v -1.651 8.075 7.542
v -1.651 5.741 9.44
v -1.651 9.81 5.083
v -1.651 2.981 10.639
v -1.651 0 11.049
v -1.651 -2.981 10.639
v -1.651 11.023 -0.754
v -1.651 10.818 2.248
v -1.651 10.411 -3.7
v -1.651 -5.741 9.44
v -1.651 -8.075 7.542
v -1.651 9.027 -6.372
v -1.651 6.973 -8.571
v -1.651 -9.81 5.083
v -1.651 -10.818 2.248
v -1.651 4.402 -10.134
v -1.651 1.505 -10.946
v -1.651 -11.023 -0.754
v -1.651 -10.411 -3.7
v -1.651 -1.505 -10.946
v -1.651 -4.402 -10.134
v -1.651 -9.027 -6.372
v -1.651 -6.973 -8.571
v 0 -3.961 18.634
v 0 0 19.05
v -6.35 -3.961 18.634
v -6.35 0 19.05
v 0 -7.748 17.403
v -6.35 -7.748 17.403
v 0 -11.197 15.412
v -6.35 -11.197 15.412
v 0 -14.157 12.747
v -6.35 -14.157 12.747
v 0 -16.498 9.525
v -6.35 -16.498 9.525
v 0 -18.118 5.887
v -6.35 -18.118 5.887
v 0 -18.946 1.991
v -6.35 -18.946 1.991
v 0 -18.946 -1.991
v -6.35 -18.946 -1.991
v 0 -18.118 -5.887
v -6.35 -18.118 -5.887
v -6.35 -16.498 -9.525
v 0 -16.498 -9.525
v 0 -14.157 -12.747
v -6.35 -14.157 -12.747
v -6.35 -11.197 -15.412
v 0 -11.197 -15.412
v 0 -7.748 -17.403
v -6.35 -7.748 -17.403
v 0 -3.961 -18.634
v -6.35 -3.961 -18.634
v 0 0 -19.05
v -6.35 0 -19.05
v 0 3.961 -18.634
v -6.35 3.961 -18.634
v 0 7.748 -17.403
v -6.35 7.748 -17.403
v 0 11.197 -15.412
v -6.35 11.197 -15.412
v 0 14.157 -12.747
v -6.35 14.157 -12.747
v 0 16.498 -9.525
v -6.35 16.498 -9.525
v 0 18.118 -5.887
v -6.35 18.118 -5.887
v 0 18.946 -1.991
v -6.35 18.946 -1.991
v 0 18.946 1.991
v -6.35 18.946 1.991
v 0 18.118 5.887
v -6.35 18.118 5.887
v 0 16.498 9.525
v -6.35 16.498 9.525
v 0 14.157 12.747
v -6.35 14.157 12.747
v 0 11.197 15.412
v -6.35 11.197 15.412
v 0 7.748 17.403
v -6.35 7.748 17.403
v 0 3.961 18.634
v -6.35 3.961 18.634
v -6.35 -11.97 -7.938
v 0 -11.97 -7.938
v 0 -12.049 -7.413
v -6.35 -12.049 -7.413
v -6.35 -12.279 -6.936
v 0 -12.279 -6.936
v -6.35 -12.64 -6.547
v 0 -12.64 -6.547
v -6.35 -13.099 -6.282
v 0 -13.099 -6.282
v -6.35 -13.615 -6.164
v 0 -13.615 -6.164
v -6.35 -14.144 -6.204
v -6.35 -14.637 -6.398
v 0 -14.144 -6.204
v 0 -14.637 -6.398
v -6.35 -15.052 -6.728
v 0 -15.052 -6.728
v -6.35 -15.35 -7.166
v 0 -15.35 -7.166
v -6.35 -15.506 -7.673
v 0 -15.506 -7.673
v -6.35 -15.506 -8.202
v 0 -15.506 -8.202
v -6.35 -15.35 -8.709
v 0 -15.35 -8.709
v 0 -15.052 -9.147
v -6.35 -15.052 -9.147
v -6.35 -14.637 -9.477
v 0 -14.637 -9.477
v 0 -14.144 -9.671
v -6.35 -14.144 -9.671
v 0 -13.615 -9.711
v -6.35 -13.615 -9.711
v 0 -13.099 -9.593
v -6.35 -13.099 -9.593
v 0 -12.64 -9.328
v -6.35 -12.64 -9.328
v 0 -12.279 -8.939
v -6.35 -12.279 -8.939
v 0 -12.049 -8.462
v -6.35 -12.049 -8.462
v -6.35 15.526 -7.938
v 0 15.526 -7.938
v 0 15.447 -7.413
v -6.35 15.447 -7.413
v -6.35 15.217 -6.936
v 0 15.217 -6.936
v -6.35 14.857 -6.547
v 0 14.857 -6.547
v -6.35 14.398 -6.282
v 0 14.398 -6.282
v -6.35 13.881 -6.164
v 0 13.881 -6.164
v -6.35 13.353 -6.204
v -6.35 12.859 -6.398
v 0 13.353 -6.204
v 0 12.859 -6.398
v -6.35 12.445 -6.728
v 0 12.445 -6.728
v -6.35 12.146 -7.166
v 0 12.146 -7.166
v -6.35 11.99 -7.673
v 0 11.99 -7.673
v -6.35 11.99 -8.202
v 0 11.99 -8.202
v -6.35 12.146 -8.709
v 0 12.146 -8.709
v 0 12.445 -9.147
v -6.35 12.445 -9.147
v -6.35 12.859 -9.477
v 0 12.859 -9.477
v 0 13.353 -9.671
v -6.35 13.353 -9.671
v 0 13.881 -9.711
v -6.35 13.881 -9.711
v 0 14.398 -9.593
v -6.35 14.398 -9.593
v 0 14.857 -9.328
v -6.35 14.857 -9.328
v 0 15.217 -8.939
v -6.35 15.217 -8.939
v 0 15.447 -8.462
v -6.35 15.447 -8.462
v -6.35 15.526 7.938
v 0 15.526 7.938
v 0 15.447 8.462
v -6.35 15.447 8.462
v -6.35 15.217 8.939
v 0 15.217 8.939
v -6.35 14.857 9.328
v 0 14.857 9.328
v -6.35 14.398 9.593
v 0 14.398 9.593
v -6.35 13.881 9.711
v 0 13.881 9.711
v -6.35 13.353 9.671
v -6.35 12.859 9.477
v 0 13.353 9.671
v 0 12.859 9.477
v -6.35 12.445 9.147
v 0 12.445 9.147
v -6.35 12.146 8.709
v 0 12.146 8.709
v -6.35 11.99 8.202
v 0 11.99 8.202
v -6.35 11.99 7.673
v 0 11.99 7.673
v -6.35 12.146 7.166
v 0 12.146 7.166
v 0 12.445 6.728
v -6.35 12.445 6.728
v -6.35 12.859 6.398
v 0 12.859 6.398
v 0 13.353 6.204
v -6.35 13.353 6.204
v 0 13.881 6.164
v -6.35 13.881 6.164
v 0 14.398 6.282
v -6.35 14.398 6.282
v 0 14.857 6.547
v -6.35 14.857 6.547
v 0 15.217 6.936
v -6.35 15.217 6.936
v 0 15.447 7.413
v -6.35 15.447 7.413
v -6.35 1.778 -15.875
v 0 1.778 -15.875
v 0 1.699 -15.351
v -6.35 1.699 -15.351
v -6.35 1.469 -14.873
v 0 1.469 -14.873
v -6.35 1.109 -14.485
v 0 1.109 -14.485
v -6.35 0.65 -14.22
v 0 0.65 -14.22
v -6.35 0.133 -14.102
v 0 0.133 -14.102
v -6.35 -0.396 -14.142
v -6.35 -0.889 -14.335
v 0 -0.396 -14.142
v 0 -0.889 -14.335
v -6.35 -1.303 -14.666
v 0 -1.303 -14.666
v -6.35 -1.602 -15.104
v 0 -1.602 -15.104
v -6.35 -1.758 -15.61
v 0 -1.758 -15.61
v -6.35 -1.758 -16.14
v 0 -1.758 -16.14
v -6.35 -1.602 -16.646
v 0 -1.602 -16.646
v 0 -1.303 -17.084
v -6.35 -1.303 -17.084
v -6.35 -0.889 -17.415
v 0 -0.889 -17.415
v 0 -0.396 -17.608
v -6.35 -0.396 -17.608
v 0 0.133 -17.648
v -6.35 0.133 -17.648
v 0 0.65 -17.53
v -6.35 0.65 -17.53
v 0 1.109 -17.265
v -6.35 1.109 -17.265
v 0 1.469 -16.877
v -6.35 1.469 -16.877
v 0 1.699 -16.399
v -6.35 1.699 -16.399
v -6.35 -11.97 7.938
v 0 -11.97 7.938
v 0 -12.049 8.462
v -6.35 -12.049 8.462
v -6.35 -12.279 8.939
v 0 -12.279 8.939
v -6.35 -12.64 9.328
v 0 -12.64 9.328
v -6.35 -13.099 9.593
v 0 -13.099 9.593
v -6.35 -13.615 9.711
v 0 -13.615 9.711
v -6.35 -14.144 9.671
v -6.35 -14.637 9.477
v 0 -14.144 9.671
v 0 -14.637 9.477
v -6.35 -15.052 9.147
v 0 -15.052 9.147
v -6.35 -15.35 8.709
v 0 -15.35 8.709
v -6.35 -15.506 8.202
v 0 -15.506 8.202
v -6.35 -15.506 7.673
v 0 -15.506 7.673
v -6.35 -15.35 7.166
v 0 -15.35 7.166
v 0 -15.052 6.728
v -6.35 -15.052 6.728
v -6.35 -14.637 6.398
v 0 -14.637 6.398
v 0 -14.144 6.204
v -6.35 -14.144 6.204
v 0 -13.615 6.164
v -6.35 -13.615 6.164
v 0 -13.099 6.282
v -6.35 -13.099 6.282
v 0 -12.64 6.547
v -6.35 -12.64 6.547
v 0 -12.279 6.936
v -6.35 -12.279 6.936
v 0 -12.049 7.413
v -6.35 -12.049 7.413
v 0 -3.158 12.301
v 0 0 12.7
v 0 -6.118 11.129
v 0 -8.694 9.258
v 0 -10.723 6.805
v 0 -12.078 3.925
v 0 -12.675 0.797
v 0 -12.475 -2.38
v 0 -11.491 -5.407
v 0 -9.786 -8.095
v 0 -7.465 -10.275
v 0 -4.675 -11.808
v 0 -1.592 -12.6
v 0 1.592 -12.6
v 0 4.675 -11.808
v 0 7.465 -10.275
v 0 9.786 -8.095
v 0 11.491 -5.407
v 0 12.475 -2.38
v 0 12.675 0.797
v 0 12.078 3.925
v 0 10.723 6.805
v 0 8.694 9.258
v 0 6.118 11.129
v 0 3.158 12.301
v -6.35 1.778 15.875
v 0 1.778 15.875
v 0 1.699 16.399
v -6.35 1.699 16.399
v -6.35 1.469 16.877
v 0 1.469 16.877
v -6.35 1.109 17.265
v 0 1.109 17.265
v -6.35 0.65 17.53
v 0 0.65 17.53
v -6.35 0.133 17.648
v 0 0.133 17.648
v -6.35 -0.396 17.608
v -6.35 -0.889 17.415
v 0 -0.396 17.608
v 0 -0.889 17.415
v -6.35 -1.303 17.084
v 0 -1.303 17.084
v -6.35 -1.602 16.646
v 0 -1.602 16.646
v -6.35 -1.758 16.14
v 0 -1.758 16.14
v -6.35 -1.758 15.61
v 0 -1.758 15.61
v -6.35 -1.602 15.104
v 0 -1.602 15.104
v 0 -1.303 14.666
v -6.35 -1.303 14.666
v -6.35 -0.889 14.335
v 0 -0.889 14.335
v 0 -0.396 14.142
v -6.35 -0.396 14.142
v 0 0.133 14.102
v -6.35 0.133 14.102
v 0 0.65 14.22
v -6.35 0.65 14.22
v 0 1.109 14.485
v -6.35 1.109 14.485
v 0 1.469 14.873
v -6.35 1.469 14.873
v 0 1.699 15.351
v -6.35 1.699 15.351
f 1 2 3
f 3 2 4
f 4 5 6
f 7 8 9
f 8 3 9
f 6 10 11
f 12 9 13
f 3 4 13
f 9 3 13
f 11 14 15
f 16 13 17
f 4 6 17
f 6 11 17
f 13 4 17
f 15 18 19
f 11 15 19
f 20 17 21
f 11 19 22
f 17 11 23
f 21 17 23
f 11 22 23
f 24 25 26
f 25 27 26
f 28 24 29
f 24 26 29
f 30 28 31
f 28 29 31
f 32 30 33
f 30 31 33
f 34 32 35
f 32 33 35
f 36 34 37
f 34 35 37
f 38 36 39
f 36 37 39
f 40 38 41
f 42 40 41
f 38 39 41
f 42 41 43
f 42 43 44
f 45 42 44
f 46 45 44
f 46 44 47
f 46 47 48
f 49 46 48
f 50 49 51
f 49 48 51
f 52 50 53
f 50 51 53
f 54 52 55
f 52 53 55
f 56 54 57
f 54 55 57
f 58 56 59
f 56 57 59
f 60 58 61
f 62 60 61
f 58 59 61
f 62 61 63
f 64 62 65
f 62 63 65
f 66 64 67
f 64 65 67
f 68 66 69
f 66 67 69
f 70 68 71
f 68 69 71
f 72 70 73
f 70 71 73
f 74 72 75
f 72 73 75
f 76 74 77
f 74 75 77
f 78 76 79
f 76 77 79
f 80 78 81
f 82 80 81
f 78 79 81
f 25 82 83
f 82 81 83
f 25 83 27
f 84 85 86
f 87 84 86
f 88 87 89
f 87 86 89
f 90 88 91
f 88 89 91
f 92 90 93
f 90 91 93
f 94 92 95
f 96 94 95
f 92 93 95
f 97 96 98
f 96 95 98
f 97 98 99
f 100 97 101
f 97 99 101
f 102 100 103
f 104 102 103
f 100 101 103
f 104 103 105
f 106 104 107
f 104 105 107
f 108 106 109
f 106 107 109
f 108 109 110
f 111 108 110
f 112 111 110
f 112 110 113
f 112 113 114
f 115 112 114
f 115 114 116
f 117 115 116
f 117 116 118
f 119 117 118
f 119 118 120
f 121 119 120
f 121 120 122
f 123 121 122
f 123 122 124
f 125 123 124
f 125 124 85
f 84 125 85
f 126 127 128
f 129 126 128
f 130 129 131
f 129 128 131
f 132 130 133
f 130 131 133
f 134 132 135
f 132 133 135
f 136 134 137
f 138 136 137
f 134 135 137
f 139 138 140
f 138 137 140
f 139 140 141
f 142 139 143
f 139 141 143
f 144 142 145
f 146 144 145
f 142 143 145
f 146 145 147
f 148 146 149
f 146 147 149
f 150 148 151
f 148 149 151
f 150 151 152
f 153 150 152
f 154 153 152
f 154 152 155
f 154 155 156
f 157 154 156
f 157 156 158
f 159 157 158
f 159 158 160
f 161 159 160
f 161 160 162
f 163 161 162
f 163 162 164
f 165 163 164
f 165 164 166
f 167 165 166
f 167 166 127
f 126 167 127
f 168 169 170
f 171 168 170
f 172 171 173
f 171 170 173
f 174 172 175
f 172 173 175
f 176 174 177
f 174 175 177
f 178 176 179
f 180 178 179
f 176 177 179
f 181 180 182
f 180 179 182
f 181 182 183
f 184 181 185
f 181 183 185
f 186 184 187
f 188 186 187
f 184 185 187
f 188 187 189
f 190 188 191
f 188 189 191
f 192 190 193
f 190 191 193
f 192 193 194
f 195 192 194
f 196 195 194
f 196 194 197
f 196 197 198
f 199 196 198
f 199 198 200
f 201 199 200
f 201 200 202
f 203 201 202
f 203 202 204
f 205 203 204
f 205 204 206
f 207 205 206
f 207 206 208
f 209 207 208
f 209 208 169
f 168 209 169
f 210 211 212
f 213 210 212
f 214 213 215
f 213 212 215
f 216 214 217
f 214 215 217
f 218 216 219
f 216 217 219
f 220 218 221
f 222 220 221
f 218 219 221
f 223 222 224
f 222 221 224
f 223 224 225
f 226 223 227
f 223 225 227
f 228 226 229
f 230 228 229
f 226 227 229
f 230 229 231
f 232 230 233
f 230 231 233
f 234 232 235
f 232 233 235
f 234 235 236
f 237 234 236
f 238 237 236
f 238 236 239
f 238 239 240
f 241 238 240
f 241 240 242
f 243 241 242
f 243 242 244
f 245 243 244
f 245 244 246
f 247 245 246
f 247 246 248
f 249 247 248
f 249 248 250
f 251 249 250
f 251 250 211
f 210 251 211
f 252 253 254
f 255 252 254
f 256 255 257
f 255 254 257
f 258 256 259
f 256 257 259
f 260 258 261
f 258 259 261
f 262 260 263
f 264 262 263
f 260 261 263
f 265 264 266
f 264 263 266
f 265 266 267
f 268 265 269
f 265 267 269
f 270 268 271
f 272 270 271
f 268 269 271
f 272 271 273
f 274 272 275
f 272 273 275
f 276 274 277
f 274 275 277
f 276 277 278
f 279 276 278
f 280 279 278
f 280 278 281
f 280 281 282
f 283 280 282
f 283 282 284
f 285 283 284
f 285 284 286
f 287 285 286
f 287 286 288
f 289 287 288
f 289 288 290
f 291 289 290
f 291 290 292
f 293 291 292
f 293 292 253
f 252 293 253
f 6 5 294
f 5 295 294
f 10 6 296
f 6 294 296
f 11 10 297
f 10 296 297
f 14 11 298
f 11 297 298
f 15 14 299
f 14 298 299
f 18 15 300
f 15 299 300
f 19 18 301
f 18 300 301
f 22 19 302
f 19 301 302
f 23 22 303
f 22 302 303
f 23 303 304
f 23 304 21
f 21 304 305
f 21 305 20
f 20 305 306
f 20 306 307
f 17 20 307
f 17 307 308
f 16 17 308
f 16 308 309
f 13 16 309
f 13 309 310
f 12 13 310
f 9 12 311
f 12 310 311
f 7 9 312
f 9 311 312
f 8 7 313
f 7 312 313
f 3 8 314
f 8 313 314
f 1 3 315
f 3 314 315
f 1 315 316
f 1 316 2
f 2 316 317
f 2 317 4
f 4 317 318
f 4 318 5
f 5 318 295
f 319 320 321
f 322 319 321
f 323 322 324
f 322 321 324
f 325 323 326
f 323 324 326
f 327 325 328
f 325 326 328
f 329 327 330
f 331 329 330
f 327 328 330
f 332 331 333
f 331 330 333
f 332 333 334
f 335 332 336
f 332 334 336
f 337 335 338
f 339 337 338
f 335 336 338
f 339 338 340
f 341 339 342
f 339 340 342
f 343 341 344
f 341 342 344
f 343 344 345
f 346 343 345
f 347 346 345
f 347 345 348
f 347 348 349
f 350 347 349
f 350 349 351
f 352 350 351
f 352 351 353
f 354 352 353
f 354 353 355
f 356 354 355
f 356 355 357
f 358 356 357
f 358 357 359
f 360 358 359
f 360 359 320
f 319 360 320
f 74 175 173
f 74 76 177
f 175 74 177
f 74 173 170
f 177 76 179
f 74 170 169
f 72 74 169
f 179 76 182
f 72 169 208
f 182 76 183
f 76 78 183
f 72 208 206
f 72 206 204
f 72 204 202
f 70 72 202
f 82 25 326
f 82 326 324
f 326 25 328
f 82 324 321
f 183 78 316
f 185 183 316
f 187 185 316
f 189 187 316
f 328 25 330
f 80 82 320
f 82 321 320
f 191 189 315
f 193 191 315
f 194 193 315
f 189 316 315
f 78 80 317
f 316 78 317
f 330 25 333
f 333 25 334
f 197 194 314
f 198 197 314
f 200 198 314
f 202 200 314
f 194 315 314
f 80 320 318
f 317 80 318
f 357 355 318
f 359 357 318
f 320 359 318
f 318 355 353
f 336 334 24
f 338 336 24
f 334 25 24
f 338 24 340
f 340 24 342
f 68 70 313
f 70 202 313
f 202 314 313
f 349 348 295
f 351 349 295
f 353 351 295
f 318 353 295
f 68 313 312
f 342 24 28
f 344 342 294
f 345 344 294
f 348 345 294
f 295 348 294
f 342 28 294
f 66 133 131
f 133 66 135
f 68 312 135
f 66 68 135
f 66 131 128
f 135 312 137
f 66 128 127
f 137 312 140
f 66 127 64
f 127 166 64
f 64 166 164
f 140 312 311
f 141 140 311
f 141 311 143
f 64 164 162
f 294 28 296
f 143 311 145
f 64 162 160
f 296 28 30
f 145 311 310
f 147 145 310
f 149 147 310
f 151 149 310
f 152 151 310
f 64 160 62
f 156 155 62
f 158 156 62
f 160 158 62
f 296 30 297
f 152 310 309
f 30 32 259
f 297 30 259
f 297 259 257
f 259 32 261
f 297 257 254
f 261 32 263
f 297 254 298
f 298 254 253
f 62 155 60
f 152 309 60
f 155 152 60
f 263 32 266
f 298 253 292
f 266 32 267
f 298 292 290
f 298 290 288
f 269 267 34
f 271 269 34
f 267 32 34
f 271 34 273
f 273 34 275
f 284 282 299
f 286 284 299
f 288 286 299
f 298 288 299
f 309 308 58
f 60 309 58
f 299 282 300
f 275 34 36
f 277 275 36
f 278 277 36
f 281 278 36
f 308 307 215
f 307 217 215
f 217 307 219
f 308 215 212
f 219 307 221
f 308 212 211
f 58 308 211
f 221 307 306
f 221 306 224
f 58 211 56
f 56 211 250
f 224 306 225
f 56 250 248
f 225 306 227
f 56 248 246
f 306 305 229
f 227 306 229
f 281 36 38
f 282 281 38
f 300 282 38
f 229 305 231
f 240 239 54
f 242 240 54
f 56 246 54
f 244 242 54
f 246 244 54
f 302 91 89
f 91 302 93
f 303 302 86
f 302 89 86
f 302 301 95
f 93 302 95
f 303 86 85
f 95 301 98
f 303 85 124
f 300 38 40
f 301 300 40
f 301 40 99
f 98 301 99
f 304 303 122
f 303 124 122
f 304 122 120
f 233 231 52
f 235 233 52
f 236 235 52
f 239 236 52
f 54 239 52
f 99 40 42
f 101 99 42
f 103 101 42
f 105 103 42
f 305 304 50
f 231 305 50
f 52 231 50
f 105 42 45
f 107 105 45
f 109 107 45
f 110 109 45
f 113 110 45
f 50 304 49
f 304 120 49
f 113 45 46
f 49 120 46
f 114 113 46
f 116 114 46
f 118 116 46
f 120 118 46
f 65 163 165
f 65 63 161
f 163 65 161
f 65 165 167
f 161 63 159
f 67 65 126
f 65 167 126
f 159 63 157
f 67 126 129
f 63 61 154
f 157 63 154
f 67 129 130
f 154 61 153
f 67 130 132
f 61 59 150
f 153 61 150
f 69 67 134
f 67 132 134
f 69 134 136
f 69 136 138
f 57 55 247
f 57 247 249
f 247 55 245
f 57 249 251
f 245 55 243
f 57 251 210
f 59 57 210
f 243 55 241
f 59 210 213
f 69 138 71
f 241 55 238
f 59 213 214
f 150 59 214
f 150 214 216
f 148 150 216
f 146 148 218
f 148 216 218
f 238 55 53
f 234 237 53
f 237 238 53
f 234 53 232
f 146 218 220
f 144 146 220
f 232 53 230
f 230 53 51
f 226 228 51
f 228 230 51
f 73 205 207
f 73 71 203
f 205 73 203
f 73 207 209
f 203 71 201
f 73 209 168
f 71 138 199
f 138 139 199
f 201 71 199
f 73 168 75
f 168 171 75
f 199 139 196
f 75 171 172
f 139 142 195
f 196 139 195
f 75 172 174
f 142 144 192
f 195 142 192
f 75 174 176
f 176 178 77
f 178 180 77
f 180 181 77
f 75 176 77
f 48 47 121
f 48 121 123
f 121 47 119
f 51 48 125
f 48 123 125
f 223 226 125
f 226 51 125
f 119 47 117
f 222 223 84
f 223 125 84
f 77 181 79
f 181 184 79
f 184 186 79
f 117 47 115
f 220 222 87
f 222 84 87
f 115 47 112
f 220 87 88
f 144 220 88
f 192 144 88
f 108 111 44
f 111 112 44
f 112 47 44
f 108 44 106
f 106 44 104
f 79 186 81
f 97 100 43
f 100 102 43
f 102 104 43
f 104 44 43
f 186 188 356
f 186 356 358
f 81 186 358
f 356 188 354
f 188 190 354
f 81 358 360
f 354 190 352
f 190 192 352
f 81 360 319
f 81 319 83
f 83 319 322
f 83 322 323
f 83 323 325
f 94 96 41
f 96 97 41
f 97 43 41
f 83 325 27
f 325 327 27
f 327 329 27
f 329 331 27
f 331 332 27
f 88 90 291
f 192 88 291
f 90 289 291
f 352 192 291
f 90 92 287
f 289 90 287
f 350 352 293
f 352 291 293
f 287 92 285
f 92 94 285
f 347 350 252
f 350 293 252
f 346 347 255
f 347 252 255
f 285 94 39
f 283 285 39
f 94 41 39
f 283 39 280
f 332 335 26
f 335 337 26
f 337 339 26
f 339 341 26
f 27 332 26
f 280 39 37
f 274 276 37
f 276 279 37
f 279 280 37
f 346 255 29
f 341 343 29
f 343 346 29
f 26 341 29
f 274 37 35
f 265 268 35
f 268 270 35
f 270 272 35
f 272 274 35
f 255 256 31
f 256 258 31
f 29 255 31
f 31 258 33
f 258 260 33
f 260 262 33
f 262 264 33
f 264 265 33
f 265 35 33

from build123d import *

# Parameters (mm, degrees)
F2_R     = 1.778
F3_DEPTH = 6.351


with BuildPart() as f1:
    # F0 (on Front) → F1 (revolve)
    with BuildSketch(Plane.XZ):
        Polygon((-1.651, 11.049), (0, 12.7), (0, 19.05), (-6.35, 19.05), (-6.35, 0), (-1.651, 0), align=None)
    revolve(axis=Axis((-4.0005, 0, 0), (1, 0, 0)))

    # F2 (on Right) → F3 (cut, through all)
    with BuildSketch(Plane.YZ):
        with Locations((0, 15.875)):
            Circle(F2_R)
        with Locations((-13.748153, 7.9375)):
            Circle(F2_R)
        with Locations((-13.748153, -7.9375)):
            Circle(F2_R)
        with Locations((0, -15.875)):
            Circle(F2_R)
        with Locations((13.748153, -7.9375)):
            Circle(F2_R)
        with Locations((13.748153, 7.9375)):
            Circle(F2_R)
    extrude(amount=-F3_DEPTH, mode=Mode.SUBTRACT)


solid = f1.part
